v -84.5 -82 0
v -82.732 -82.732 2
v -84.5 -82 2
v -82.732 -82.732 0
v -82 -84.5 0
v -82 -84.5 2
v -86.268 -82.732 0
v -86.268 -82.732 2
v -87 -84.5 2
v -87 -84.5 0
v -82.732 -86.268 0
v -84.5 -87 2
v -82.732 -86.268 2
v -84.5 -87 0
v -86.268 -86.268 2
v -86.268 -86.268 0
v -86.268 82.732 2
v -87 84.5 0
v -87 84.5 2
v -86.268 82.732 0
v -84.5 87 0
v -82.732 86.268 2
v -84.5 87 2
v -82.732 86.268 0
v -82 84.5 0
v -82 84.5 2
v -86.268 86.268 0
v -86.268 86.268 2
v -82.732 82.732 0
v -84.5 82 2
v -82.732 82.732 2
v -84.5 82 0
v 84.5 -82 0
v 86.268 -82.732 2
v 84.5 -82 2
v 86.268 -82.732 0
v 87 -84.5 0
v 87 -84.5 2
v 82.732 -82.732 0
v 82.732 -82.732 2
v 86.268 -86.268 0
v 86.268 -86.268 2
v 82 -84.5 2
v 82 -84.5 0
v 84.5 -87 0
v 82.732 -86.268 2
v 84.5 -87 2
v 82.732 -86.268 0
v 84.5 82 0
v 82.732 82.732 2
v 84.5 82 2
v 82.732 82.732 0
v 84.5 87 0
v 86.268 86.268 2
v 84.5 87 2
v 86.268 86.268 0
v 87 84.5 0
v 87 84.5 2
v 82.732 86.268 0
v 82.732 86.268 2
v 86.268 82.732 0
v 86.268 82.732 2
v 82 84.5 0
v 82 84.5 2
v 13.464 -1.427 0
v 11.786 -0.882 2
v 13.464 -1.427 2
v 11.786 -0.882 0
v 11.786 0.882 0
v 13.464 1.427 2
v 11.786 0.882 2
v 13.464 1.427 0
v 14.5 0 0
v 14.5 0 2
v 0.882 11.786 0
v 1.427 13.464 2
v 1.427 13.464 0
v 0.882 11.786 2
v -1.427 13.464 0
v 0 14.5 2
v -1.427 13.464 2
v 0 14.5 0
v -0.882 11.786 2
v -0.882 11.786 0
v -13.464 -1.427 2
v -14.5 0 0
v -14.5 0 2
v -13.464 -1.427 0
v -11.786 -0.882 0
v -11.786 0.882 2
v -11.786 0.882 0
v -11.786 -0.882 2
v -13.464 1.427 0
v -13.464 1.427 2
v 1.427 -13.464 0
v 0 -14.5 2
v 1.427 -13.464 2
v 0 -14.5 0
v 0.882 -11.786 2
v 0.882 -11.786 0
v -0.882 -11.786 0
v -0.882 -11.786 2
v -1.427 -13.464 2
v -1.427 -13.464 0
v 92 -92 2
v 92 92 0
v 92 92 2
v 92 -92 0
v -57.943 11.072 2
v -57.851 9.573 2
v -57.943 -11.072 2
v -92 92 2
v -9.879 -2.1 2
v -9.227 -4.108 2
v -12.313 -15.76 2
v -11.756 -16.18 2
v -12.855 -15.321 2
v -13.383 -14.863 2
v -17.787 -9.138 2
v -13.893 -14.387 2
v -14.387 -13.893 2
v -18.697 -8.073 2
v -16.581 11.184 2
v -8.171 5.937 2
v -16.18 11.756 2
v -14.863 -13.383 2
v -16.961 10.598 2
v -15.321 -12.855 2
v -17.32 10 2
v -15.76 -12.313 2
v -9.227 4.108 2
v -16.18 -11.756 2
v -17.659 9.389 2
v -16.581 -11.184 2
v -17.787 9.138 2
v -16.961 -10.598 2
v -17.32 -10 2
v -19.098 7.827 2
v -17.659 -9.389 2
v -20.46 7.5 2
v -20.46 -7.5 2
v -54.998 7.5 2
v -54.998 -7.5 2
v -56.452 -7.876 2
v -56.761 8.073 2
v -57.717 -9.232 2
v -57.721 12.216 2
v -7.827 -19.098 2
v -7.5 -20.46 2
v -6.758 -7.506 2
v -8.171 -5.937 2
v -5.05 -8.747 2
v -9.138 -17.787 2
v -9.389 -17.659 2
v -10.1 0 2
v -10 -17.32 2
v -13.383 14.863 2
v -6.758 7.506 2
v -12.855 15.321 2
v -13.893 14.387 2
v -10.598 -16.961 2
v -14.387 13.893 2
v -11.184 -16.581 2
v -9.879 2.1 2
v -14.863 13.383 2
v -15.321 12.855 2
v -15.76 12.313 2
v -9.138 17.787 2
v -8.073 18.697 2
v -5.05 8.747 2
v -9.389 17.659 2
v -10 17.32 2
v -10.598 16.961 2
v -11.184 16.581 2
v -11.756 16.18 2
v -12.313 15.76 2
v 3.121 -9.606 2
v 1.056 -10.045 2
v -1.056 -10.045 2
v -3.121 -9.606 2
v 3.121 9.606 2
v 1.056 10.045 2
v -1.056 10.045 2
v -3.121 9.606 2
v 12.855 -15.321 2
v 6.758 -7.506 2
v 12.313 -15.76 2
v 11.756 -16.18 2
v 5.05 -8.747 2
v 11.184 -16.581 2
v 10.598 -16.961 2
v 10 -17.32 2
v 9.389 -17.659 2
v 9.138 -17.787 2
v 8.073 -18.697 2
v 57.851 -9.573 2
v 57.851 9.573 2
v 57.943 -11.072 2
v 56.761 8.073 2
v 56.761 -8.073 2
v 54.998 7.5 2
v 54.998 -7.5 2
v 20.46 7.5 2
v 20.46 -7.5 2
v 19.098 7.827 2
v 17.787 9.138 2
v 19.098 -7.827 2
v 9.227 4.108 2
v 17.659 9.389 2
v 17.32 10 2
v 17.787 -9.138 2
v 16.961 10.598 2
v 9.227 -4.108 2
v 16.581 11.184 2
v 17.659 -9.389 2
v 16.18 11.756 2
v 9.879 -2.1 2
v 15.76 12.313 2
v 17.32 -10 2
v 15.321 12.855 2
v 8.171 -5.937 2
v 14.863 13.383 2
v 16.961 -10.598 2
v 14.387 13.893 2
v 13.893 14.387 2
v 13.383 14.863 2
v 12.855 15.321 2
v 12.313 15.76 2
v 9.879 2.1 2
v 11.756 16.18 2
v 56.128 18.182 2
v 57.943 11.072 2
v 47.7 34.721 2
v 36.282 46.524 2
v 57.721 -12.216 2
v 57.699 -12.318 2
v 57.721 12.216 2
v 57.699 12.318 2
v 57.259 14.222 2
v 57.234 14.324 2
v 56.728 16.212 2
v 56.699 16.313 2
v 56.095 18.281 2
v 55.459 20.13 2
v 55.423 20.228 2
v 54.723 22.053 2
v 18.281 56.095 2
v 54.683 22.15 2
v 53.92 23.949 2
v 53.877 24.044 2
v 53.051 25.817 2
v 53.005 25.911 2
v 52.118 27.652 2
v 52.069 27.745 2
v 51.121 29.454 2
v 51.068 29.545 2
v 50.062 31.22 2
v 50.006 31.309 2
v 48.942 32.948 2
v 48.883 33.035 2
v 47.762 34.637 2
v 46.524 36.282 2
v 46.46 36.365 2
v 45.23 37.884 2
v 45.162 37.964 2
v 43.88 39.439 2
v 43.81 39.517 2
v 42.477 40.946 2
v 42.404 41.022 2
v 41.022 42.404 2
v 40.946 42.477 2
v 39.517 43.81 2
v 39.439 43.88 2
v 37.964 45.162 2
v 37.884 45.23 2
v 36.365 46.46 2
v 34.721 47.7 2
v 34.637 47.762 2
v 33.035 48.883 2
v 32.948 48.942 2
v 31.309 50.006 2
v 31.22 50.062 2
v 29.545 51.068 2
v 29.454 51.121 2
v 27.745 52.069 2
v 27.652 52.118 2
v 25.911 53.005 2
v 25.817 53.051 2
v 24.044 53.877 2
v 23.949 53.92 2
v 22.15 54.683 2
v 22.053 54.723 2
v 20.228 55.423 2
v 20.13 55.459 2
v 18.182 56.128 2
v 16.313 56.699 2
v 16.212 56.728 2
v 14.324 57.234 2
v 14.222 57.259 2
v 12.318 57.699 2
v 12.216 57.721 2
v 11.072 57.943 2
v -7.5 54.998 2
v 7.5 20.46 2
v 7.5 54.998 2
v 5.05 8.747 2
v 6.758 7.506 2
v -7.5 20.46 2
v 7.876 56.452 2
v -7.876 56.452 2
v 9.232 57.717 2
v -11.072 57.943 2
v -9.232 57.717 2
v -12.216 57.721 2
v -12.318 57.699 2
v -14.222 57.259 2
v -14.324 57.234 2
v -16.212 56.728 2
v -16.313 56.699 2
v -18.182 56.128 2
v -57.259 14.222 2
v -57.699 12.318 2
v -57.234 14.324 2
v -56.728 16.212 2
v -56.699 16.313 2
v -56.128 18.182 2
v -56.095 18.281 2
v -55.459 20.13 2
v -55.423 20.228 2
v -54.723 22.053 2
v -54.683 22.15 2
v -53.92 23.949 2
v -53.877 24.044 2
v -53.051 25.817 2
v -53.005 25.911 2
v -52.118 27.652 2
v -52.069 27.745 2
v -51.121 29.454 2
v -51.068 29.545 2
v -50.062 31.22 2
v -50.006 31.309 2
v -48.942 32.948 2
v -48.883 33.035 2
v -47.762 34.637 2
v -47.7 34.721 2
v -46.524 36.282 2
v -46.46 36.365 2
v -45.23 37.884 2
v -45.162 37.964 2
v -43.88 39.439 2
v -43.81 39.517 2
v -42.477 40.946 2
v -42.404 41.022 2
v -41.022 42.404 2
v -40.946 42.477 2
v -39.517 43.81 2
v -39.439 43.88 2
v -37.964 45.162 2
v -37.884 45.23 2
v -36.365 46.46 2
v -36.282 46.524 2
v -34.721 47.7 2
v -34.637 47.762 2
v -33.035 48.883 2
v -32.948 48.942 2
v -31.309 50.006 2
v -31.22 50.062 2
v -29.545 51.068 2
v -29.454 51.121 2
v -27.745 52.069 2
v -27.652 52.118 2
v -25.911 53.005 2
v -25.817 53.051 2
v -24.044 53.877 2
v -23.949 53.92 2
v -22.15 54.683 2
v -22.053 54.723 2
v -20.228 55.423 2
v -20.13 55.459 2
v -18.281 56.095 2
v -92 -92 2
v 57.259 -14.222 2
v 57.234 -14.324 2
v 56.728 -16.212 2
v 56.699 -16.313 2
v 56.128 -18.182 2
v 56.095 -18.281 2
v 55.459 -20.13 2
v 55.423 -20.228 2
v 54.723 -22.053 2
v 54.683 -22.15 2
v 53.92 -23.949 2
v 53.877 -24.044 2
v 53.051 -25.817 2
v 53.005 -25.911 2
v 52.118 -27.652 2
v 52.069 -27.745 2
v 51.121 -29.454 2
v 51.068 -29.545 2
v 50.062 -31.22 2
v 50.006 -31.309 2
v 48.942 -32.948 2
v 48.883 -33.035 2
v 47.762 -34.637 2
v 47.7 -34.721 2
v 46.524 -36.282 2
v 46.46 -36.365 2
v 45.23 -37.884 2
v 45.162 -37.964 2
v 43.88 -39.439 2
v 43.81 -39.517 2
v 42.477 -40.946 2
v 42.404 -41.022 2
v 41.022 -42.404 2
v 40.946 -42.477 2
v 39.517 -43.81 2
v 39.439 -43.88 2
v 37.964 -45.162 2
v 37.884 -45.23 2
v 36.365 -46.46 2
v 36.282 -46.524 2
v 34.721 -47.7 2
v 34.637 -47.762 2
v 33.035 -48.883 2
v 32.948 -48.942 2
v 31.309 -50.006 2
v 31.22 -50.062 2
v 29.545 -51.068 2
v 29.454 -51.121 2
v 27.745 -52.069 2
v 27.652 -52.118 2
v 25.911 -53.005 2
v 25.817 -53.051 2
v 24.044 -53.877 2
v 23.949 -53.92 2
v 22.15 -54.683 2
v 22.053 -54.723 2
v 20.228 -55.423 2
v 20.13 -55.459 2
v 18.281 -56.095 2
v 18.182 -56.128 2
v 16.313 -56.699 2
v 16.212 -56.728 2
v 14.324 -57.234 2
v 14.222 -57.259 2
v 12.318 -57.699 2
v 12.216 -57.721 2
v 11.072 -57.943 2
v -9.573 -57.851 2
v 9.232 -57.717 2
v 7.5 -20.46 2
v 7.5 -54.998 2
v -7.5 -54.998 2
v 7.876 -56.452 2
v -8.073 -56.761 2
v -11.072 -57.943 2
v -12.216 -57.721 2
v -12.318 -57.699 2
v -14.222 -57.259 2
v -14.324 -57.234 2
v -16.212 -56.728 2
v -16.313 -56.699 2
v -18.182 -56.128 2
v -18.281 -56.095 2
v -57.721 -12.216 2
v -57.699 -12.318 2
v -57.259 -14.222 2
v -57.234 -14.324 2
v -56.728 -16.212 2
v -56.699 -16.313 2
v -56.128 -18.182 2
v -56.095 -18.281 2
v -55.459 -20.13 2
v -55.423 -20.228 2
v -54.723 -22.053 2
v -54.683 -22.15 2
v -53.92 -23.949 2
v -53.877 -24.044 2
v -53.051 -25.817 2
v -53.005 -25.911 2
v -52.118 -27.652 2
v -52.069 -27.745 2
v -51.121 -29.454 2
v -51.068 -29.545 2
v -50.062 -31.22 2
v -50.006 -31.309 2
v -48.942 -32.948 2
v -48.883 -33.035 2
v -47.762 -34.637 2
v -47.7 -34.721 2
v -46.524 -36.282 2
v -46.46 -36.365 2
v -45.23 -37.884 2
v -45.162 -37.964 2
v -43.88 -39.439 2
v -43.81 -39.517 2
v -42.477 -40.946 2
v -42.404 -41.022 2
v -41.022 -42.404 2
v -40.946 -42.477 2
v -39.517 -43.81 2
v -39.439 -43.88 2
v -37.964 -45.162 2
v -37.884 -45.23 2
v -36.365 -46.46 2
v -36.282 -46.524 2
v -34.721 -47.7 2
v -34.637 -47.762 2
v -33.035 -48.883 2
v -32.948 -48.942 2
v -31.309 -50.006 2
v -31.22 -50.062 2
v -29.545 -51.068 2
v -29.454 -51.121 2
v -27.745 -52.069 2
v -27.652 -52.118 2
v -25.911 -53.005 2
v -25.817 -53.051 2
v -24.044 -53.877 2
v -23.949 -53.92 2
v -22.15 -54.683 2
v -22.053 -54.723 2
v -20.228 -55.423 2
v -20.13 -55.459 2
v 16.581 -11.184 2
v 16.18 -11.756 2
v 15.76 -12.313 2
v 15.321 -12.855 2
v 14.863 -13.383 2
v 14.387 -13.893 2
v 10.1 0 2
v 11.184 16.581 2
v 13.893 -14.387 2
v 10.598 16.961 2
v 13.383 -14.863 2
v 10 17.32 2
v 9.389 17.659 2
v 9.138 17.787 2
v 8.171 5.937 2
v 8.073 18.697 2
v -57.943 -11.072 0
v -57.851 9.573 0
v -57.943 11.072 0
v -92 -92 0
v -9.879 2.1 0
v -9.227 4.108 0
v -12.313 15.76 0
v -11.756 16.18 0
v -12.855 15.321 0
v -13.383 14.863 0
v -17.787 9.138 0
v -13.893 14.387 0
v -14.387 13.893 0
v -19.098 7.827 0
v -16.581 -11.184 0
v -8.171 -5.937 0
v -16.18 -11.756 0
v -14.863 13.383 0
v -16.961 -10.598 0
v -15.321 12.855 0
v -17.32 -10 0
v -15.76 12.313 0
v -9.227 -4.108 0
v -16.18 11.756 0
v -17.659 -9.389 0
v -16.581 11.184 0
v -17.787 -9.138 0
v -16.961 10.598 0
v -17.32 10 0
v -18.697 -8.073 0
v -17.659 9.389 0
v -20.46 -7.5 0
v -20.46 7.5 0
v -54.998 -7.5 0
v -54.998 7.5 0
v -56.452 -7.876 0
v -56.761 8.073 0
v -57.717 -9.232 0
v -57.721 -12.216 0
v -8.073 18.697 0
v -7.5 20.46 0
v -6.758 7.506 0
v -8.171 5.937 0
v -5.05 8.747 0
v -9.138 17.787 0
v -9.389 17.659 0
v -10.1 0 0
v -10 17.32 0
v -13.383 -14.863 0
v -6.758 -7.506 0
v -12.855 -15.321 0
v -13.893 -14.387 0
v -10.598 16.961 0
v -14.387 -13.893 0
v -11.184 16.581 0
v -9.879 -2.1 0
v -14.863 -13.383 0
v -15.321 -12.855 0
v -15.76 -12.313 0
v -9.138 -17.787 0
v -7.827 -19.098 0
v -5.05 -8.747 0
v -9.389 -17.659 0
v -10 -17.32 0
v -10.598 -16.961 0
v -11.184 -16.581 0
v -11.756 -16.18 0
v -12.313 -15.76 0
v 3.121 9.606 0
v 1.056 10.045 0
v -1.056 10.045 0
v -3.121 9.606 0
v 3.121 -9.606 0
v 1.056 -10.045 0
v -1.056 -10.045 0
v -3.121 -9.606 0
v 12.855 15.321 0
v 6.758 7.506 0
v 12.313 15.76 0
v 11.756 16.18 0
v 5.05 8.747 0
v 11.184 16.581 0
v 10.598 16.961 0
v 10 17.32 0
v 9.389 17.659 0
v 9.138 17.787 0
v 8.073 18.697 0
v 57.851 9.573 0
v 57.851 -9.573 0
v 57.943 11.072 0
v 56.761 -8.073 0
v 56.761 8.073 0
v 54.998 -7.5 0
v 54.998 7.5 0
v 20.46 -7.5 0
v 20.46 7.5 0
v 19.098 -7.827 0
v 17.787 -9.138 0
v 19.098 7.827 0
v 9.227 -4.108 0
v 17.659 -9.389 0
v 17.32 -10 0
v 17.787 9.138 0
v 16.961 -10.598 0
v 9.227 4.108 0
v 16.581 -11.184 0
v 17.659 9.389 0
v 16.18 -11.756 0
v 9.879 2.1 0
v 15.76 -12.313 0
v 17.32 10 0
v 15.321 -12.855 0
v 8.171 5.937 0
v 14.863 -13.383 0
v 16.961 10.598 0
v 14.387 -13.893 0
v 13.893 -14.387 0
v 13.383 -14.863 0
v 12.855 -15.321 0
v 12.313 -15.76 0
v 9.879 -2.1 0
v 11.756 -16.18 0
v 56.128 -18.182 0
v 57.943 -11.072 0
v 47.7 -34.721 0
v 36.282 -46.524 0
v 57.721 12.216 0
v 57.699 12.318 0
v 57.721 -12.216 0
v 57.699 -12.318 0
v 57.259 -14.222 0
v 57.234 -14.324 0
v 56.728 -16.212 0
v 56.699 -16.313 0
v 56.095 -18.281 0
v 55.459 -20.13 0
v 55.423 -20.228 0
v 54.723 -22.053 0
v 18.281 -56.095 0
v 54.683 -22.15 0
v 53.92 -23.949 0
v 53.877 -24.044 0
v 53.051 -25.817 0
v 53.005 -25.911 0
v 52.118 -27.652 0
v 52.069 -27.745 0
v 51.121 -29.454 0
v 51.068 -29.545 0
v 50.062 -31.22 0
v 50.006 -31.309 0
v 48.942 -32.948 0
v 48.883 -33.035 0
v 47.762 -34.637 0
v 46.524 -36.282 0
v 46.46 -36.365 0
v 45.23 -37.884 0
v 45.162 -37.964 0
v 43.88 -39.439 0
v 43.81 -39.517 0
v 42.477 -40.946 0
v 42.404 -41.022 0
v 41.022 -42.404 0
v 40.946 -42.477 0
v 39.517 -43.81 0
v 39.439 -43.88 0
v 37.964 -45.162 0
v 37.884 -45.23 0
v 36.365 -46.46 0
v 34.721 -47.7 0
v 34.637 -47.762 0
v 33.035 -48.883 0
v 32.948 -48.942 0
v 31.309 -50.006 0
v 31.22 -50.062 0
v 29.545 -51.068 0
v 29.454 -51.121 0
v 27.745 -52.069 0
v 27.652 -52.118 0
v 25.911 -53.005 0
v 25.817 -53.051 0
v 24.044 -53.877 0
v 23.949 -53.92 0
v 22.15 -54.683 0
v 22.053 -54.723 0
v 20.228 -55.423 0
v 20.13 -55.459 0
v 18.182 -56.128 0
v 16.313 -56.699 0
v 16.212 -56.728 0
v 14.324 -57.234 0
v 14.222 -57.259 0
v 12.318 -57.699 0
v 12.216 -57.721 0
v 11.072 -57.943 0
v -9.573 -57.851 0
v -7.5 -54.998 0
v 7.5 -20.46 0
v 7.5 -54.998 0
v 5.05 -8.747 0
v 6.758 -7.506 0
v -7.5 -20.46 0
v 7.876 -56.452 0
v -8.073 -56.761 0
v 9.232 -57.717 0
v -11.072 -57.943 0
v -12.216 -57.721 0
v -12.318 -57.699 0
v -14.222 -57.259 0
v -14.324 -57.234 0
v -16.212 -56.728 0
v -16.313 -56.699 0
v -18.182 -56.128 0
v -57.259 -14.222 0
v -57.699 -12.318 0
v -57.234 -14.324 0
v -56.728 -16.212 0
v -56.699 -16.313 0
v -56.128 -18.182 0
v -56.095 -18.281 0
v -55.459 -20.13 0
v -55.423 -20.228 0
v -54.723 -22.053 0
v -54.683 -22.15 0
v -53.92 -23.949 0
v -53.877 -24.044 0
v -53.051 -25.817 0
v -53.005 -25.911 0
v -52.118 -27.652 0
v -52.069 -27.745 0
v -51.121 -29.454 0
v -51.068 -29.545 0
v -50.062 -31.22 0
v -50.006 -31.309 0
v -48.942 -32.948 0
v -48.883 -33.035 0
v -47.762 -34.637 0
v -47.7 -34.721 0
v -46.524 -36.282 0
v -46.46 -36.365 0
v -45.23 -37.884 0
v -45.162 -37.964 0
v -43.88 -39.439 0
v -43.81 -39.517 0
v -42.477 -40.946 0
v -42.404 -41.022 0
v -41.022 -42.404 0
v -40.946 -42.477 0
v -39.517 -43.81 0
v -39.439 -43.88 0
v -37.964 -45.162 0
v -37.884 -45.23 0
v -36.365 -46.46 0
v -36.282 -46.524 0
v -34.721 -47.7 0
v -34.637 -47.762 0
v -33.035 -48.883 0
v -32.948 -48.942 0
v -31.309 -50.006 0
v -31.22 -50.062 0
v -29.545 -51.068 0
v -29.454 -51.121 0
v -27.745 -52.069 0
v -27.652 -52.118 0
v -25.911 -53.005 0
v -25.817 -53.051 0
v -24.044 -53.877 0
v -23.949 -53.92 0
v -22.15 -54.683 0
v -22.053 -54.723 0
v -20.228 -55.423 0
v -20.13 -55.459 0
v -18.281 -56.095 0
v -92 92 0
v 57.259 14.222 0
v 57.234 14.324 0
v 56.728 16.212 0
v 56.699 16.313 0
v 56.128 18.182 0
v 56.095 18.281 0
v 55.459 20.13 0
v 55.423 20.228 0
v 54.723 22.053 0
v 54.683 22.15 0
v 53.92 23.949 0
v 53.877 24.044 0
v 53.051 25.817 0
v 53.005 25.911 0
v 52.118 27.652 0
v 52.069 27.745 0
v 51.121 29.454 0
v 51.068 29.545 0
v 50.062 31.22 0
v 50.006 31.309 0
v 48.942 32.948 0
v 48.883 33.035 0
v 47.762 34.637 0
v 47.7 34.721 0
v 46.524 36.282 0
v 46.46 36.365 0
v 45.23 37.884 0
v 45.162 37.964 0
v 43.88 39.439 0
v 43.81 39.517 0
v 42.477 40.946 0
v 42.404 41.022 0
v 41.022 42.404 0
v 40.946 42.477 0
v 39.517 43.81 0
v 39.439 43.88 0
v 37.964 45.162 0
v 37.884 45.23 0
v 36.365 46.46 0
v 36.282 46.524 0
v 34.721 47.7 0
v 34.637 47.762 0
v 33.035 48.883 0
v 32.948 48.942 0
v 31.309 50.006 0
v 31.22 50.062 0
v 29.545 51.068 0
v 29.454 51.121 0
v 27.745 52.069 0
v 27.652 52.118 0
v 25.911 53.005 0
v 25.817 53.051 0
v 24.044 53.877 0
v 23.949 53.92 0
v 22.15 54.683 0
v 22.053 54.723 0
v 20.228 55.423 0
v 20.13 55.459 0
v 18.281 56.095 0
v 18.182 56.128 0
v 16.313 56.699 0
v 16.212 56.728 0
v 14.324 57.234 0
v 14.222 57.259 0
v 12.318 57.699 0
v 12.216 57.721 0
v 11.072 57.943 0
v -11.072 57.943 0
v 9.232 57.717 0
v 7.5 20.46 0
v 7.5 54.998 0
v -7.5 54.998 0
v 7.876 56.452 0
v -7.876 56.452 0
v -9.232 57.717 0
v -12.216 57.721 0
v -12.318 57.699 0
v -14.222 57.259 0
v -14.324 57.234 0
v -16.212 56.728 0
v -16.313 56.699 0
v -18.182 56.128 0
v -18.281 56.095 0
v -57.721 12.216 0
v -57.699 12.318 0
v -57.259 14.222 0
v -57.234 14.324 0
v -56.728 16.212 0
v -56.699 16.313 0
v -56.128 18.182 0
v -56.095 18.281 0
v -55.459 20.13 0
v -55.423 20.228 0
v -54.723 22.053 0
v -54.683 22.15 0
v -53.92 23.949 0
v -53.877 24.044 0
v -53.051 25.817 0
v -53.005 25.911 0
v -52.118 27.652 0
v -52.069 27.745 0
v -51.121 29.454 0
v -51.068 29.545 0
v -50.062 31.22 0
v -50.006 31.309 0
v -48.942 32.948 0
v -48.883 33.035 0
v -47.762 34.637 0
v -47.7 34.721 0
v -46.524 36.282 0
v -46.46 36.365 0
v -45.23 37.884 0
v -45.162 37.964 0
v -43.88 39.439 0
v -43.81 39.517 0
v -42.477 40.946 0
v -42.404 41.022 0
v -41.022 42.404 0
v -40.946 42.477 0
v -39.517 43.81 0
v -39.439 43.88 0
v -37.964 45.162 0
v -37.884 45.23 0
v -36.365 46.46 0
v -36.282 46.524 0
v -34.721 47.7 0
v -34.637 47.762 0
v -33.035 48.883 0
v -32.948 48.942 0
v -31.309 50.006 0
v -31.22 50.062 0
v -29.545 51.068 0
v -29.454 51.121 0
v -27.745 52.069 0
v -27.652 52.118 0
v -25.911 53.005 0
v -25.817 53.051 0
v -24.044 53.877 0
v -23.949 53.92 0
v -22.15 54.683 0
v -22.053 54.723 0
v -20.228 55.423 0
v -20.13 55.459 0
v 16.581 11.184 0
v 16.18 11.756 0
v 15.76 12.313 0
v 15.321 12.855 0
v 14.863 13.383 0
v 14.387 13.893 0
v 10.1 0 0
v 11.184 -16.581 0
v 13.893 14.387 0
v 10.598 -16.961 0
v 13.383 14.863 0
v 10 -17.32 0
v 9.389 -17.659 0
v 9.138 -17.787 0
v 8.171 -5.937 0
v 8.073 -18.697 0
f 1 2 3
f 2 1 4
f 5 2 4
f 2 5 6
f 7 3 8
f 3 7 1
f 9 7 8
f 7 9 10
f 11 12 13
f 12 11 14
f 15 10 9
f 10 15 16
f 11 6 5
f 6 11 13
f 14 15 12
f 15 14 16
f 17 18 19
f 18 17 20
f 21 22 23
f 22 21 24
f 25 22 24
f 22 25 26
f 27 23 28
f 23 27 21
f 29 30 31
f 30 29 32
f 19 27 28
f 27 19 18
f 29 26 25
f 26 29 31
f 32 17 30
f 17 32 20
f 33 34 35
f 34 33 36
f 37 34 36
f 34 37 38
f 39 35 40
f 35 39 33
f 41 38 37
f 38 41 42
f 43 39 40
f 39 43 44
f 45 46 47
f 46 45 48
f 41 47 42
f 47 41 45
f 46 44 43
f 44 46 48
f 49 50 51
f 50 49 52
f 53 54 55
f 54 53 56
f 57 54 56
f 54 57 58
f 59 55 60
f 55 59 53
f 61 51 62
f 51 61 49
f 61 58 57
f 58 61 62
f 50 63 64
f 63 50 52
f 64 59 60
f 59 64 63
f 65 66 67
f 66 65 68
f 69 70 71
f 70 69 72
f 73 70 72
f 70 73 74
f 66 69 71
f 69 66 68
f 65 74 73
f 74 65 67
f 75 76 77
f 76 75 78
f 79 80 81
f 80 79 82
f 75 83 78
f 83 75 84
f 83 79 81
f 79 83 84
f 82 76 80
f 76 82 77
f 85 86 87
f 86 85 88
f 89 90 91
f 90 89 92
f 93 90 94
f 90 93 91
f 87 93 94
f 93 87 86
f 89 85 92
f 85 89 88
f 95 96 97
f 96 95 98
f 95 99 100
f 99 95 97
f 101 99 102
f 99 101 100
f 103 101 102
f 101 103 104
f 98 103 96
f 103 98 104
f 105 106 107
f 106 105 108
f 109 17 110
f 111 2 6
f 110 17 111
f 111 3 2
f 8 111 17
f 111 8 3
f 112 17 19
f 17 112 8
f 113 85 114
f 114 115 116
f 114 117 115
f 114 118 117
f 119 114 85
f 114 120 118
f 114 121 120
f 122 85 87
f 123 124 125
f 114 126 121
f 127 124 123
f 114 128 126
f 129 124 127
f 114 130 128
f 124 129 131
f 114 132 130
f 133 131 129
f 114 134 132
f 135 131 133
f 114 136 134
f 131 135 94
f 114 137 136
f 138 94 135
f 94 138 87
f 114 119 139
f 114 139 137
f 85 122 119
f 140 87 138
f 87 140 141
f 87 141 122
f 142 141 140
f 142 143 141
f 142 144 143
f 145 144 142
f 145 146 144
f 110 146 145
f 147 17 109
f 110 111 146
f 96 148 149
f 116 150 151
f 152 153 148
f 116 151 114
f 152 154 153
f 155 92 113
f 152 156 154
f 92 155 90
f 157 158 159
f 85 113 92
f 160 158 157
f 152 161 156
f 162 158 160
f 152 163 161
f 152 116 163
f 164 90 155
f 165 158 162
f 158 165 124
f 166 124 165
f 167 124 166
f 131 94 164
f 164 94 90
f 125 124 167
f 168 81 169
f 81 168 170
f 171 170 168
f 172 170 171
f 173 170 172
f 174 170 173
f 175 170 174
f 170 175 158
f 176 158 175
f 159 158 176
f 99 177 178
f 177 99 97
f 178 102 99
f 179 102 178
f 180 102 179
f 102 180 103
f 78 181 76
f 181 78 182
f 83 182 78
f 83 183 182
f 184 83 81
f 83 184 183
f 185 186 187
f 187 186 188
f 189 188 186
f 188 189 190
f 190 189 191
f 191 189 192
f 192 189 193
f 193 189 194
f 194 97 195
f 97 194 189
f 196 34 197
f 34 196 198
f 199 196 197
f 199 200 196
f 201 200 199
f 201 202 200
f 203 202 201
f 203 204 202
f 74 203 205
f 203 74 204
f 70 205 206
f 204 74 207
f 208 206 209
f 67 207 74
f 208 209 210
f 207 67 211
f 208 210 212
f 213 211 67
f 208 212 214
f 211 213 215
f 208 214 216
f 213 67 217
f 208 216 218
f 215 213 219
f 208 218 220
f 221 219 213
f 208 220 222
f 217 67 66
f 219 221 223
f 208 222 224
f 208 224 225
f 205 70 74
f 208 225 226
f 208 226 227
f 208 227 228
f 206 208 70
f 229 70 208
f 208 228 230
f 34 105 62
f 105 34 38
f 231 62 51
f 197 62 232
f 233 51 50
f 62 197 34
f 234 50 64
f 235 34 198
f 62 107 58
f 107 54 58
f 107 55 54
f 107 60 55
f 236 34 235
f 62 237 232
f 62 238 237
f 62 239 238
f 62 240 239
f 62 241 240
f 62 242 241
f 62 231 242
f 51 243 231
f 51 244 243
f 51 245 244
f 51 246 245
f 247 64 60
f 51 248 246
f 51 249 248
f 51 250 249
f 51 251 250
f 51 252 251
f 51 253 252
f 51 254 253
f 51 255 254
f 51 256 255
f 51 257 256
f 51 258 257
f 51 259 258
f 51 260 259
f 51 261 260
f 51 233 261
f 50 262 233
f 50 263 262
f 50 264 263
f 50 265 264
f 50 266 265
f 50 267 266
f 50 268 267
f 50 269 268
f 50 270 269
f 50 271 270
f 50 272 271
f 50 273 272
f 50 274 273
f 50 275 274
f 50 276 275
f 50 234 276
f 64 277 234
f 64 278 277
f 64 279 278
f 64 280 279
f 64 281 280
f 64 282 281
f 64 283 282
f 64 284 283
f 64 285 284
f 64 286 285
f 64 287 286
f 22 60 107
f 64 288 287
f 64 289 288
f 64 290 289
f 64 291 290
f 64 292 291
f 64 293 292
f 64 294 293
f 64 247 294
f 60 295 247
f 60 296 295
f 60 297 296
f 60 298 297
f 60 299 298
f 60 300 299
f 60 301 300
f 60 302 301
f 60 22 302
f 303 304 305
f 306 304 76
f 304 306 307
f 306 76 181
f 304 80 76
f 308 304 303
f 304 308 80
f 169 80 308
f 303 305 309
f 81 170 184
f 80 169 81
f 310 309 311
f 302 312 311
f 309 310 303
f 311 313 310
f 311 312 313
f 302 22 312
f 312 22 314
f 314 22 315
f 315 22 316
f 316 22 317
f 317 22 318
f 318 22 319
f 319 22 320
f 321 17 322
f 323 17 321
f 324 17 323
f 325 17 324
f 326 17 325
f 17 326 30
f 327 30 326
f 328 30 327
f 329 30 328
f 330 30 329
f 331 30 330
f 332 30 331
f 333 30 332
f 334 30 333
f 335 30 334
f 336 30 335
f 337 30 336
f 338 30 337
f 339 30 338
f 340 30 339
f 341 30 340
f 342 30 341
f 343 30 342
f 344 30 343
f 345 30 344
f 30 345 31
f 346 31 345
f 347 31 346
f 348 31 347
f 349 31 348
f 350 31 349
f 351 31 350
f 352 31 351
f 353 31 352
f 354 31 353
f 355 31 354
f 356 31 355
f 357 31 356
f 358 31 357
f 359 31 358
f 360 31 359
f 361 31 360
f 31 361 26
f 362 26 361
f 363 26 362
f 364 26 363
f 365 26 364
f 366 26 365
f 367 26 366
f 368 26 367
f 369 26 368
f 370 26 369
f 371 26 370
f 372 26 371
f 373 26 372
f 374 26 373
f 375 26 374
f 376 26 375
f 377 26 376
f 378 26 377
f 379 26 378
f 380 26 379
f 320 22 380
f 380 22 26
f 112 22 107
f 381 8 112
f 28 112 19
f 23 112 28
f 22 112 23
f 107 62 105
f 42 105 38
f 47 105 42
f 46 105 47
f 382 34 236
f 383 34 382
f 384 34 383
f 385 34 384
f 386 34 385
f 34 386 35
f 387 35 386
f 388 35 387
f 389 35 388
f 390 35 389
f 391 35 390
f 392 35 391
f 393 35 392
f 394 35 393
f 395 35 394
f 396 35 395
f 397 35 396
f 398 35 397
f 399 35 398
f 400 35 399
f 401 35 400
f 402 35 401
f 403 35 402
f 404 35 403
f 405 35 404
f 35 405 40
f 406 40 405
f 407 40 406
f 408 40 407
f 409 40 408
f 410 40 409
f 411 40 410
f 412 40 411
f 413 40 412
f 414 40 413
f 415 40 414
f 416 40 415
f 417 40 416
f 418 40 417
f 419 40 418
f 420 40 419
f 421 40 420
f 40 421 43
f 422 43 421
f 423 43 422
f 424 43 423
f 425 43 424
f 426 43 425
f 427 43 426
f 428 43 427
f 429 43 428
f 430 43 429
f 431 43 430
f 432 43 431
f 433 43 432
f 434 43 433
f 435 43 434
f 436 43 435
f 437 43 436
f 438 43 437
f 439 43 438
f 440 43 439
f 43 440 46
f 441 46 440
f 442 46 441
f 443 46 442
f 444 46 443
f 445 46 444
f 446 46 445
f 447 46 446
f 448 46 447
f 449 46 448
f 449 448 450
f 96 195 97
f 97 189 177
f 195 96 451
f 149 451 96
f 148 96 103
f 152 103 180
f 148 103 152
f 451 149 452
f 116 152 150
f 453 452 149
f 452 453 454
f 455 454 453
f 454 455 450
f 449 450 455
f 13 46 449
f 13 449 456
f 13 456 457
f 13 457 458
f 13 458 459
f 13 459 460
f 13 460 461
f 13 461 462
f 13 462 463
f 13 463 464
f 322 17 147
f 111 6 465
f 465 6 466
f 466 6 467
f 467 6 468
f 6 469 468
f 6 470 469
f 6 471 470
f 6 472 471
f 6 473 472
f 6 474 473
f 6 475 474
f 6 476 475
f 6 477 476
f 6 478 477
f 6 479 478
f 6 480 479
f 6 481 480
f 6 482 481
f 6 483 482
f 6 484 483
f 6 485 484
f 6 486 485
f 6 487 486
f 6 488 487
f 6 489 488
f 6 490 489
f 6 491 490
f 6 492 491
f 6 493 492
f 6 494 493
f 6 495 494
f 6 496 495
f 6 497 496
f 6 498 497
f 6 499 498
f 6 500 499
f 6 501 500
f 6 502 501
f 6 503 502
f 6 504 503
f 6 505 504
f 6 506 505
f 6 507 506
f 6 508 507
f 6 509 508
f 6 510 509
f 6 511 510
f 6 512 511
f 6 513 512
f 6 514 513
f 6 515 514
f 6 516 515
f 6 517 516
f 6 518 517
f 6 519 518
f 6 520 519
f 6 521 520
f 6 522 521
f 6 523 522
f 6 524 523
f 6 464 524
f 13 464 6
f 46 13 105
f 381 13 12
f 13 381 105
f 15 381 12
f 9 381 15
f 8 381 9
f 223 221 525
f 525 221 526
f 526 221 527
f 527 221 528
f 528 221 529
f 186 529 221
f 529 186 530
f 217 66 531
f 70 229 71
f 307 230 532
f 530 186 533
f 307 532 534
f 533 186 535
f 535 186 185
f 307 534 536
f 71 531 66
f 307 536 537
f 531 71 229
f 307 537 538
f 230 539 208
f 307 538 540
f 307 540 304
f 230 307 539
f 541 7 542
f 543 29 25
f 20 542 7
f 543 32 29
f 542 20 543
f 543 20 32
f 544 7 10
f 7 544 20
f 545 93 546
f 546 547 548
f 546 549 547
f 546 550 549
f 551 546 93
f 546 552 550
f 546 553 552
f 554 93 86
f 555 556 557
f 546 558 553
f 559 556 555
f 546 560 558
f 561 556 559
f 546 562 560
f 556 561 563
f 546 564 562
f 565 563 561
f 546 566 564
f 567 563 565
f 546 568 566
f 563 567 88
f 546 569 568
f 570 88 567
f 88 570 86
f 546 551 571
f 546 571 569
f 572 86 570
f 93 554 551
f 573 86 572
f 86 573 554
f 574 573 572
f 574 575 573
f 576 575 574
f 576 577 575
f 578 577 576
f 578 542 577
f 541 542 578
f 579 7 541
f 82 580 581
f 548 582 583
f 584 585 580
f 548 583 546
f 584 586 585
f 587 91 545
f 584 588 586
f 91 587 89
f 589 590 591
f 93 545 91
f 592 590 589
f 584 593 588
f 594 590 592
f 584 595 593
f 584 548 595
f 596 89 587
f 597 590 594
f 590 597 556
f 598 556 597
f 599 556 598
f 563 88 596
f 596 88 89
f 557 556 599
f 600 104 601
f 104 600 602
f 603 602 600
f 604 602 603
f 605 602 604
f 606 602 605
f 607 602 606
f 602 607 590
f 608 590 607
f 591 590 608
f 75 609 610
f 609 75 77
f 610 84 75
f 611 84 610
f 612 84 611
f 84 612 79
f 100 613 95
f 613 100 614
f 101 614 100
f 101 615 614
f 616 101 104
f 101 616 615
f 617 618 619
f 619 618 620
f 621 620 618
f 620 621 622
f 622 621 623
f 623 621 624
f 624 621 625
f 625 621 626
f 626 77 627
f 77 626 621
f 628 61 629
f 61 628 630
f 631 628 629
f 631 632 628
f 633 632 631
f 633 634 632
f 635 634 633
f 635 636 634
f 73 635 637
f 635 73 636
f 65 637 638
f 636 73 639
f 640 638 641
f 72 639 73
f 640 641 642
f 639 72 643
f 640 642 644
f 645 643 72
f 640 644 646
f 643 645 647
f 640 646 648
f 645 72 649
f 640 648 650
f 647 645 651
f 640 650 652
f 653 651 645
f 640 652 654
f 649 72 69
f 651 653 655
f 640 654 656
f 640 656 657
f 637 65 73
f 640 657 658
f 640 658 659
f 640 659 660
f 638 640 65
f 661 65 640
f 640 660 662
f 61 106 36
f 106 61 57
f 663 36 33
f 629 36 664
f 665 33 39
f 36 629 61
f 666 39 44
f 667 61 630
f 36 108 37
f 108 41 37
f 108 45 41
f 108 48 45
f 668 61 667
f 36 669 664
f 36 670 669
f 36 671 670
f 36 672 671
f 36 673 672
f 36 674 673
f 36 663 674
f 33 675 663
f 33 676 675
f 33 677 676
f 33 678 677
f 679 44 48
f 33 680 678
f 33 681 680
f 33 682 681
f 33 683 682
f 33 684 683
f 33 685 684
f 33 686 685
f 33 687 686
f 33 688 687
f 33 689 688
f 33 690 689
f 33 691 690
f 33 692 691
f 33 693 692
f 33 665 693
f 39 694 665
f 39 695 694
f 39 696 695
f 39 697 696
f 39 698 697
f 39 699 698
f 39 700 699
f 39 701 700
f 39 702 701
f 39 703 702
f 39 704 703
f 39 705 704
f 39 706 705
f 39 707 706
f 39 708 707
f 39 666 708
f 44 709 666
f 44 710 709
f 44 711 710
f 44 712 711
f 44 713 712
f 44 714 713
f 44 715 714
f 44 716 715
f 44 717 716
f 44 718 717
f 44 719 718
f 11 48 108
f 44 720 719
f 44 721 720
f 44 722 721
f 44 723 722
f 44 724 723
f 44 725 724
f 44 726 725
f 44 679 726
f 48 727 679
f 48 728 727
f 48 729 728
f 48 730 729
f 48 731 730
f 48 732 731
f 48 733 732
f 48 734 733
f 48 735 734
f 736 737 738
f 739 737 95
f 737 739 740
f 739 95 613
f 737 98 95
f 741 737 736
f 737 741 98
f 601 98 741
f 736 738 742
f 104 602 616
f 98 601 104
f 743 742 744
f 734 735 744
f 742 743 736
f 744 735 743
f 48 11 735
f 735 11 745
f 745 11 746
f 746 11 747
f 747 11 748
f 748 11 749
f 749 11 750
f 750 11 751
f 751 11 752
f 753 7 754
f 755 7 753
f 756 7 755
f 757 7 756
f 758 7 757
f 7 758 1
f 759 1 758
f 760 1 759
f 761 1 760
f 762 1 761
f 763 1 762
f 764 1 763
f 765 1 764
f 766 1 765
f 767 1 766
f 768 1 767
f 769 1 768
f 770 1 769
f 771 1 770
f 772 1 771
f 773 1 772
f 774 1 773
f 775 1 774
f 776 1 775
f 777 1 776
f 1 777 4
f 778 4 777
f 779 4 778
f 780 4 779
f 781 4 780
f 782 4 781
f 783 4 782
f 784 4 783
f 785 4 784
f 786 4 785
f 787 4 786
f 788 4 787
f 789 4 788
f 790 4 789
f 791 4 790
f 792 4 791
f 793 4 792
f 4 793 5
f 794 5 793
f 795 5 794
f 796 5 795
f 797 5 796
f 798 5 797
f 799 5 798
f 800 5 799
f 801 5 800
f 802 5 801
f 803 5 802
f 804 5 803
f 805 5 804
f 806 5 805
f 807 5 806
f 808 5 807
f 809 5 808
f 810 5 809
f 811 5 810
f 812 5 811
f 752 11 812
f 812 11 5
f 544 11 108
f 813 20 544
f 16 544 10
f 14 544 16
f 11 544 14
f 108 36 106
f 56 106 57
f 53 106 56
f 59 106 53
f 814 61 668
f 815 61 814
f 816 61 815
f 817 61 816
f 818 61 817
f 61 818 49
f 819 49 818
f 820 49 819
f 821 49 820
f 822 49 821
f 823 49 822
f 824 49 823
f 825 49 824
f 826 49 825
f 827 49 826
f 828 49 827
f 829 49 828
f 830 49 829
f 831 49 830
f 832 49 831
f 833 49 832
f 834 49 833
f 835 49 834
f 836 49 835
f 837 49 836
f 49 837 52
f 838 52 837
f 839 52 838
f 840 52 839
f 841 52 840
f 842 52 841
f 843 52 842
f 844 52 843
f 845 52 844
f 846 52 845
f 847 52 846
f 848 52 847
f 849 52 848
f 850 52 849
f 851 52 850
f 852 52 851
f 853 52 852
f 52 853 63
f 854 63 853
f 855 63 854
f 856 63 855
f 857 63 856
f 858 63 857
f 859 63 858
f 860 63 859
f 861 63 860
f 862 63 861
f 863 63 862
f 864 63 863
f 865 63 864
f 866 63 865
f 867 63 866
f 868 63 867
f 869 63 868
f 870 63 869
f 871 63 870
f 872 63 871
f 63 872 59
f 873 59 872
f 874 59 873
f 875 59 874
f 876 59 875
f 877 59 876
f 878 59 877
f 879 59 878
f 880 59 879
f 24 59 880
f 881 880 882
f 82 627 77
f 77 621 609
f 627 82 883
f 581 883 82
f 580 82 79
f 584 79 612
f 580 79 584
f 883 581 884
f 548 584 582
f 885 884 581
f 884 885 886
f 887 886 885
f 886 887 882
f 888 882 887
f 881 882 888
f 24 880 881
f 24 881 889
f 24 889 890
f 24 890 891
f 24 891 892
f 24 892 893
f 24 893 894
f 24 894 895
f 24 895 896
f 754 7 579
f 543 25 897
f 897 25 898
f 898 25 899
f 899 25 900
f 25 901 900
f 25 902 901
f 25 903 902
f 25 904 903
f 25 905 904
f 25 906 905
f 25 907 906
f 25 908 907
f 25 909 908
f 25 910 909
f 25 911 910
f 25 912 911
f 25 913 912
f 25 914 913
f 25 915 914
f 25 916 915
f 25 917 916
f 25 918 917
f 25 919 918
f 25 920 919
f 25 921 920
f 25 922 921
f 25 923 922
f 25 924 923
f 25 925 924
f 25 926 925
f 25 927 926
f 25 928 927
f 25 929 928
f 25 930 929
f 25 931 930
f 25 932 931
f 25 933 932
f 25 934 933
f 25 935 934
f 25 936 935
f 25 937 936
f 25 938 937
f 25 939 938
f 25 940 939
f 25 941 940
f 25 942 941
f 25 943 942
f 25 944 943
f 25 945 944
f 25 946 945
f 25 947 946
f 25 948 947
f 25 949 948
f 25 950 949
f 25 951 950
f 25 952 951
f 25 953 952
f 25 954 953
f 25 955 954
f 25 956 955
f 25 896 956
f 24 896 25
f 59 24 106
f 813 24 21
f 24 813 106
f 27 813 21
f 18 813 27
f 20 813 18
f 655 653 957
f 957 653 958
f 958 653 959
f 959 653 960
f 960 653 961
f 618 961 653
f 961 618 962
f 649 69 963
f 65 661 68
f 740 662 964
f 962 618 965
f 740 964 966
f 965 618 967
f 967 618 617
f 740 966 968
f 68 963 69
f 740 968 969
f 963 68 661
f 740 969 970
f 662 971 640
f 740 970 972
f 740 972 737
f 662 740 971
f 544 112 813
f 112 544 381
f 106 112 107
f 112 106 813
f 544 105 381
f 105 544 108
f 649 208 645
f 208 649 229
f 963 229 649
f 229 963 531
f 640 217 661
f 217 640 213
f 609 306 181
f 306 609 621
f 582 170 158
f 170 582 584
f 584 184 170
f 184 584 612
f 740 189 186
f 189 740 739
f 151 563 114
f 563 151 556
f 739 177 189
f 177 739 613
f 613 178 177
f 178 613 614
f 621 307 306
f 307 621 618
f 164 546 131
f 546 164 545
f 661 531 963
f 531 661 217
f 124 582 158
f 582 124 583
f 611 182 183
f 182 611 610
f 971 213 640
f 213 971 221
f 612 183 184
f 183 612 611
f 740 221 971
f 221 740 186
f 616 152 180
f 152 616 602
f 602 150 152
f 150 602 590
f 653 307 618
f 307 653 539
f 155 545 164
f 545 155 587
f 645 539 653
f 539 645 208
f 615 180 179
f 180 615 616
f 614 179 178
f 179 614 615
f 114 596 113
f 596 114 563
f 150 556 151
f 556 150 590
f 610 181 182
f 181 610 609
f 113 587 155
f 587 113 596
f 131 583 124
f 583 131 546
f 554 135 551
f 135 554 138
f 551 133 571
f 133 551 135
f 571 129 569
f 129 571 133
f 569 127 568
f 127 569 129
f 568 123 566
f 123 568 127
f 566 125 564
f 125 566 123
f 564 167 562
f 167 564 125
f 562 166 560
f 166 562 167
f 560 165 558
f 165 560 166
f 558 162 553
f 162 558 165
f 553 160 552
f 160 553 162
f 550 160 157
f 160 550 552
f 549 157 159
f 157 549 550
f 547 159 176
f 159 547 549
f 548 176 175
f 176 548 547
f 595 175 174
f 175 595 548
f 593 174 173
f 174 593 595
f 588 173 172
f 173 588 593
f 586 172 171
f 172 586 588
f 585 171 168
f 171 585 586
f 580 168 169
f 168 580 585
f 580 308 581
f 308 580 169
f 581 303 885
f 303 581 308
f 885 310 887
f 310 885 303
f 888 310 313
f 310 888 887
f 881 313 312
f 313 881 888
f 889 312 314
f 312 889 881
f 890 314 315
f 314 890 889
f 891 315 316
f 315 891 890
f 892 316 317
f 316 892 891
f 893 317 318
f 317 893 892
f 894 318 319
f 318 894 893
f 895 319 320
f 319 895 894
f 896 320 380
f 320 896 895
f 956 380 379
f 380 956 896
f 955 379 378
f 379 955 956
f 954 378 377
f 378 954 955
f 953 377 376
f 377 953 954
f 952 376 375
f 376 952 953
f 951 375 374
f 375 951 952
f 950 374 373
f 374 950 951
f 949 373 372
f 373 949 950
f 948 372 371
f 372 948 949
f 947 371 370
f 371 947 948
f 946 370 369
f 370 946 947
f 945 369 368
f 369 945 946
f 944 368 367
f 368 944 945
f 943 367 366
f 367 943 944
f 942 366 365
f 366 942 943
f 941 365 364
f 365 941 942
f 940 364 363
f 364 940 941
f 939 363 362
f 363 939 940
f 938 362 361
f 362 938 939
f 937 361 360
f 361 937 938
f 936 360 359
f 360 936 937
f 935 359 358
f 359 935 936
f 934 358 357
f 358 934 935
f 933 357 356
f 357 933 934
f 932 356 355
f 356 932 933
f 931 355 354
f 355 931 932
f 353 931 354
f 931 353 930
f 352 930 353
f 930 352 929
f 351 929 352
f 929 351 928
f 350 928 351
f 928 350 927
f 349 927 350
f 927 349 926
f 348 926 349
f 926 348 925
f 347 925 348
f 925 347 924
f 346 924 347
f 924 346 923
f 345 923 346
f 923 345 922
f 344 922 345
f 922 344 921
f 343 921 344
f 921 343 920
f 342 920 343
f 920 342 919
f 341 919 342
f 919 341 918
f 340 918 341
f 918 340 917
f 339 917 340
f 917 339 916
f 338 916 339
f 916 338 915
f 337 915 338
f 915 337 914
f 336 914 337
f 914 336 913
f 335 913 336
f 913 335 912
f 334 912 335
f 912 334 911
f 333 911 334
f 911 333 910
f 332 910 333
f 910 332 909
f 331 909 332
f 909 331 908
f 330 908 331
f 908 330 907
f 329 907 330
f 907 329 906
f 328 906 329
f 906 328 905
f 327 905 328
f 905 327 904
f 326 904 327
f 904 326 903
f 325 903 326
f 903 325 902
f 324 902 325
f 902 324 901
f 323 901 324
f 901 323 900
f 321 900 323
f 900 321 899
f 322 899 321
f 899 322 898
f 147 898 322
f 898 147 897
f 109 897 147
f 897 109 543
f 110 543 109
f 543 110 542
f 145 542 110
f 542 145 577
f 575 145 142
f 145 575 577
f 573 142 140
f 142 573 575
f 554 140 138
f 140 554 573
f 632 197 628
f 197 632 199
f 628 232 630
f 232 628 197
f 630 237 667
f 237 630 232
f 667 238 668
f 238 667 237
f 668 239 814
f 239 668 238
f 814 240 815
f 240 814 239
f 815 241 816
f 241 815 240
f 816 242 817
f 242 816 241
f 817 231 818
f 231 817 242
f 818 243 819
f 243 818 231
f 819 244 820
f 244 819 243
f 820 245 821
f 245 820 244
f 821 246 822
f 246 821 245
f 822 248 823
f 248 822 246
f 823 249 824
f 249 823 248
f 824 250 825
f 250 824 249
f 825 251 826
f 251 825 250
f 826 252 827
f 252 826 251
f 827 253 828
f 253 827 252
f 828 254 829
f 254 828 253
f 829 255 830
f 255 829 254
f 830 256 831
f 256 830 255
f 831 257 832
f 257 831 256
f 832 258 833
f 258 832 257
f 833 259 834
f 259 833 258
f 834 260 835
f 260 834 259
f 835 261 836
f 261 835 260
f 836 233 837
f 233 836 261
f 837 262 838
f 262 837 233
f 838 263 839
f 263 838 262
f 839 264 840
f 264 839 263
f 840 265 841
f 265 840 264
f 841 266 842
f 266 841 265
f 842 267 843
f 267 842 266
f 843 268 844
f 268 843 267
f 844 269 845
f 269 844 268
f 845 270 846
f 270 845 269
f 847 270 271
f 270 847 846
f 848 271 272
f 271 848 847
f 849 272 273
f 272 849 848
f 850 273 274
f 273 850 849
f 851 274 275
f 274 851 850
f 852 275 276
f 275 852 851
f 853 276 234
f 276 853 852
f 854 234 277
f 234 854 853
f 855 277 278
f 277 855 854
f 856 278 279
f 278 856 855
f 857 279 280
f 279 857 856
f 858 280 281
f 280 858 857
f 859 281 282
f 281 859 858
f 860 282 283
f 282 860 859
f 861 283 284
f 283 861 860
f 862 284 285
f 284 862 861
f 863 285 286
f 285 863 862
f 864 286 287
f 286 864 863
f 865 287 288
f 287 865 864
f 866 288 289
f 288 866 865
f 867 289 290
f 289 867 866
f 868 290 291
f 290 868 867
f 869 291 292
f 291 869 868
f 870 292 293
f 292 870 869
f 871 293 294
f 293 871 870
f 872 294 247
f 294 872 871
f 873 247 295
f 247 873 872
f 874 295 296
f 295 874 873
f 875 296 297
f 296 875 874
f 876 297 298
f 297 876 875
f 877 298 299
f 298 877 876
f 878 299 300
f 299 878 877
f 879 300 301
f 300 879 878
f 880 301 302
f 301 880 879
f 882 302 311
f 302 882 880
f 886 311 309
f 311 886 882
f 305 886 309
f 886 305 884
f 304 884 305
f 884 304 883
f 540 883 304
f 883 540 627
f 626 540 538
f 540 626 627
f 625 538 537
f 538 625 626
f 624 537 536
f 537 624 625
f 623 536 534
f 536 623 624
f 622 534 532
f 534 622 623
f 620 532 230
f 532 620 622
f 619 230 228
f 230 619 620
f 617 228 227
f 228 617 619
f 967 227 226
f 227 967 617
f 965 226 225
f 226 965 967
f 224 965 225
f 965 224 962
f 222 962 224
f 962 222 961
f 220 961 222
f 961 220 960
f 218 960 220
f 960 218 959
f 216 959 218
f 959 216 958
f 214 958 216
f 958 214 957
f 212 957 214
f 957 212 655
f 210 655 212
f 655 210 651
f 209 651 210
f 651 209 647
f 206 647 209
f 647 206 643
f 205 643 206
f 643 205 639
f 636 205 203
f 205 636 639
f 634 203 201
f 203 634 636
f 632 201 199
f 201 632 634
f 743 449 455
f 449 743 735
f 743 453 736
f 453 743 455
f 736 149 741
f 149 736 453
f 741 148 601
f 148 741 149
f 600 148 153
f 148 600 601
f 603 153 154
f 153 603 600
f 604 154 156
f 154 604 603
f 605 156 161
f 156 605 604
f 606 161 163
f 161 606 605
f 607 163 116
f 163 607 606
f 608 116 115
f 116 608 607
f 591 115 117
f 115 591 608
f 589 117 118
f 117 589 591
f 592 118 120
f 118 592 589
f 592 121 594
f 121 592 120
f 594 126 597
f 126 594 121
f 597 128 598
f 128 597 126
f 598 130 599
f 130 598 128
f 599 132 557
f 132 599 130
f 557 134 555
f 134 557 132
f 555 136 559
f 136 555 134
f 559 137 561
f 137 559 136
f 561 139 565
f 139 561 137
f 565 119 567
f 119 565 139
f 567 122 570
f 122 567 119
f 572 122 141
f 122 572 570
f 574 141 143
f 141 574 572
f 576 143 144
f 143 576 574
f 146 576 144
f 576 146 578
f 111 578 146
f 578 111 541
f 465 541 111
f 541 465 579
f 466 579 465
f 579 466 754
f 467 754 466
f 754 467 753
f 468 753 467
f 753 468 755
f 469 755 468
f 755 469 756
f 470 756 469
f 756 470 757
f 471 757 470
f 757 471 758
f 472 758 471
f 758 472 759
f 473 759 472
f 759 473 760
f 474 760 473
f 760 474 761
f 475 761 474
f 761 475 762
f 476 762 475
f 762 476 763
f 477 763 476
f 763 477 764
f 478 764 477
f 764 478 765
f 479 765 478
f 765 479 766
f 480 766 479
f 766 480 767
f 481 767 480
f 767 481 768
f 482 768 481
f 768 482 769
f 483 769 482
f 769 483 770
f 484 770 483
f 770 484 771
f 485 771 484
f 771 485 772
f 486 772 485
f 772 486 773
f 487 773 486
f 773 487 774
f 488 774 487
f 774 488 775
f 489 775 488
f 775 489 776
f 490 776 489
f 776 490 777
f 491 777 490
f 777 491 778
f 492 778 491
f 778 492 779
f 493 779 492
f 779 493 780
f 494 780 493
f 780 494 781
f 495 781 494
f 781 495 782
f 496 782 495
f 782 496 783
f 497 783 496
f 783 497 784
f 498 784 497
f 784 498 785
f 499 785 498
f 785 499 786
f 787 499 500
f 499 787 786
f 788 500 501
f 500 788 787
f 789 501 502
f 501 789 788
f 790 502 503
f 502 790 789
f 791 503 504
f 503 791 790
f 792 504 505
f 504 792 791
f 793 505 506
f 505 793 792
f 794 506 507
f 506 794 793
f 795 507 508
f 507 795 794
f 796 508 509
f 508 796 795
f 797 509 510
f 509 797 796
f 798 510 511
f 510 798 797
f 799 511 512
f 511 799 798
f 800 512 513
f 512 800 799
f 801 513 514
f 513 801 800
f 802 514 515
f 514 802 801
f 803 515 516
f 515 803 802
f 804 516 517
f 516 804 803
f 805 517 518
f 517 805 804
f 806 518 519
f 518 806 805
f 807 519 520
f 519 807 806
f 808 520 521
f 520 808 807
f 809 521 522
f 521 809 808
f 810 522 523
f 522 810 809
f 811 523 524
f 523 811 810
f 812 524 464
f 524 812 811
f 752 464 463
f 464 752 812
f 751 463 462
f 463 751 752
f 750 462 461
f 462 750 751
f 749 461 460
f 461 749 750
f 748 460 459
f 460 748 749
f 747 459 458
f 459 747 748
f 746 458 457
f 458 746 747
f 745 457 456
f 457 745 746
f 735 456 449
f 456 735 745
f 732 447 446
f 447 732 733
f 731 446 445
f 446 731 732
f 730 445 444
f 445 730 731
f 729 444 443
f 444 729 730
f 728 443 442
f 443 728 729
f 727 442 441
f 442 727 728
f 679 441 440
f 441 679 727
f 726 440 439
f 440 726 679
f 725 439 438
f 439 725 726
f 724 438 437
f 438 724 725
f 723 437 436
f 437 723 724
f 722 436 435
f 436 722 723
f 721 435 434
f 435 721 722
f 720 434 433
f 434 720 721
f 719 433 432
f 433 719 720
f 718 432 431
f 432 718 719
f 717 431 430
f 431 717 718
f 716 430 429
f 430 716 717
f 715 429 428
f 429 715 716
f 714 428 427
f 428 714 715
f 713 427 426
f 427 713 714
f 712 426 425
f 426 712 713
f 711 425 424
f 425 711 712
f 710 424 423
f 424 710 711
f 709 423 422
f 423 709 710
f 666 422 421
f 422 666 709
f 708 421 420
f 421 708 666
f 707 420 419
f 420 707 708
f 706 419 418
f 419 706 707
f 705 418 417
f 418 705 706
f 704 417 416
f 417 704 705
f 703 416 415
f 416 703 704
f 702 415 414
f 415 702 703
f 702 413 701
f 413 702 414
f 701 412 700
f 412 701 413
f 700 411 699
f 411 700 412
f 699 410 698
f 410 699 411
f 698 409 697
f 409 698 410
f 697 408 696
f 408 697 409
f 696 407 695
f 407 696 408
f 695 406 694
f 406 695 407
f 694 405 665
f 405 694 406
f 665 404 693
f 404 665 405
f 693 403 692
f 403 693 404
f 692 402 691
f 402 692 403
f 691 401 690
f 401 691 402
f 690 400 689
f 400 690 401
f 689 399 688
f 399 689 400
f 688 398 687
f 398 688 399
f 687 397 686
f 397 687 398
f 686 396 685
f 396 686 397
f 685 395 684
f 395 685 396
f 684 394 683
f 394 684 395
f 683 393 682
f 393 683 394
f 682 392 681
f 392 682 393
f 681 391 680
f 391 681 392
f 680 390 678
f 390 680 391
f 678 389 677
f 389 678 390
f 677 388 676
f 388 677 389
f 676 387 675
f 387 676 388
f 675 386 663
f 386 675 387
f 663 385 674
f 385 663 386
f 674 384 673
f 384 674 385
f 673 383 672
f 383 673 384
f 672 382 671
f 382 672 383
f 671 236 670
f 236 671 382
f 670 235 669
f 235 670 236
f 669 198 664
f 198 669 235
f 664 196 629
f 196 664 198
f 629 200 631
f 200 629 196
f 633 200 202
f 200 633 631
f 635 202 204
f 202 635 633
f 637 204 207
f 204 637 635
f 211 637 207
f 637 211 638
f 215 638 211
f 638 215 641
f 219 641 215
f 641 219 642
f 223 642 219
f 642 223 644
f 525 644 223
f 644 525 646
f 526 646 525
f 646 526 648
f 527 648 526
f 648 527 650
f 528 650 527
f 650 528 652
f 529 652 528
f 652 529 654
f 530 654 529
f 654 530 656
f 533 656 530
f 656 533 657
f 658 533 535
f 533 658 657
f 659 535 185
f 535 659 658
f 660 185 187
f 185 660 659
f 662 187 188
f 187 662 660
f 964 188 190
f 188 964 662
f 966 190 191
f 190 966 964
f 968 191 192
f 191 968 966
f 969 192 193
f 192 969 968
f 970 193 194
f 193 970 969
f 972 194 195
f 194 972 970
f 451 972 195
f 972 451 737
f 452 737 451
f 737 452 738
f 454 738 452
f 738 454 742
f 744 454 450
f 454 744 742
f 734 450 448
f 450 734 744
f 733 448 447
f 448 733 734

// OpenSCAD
// part_id: sp5
// name: SP5 superior plate
// source_drawing_ids: DRW-022;DRW-056
// units: mm
// revision: 0.2-drw022
// SPDX-License-Identifier: MIT

module sp5_quadrant_window(r_inner = 20.0, r_outer = 59.0, neck_half = 7.5, fillet_r = 3.0) {
    // Window profile based on DRW-022: R59 outer, R20 inner, 15 mm neck gap.
    if (fillet_r > 0) {
        offset(r = fillet_r)
            offset(delta = -fillet_r)
                intersection() {
                    difference() {
                        circle(r = r_outer, $fn = 180);
                        circle(r = r_inner, $fn = 180);
                    }
                    translate([neck_half, neck_half]) square([r_outer, r_outer], center = false);
                }
    } else {
        intersection() {
            difference() {
                circle(r = r_outer, $fn = 180);
                circle(r = r_inner, $fn = 180);
            }
            translate([neck_half, neck_half]) square([r_outer, r_outer], center = false);
        }
    }
}

module part_sp5(
    size = 184.0,
    thickness = 2.0,
    corner_hole_d = 5.0,
    corner_offset = 7.5,
    center_bore_d = 20.2,
    rivet_hole_d = 3.0,
    rivet_radius = 13.0,
    window_outer_r = 59.0,
    window_inner_r = 20.0,
    window_neck_half = 7.5,
    window_fillet_r = 3.0
) {
    difference() {
        translate([-size / 2, -size / 2, 0]) cube([size, size, thickness], center = false);

        // Corner mounting holes.
        for (sx = [-1, 1], sy = [-1, 1]) {
            translate([sx * (size / 2 - corner_offset), sy * (size / 2 - corner_offset), -0.1])
                cylinder(d = corner_hole_d, h = thickness + 0.2, center = false);
        }

        // Main center bore.
        translate([0, 0, -0.1]) cylinder(d = center_bore_d, h = thickness + 0.2, center = false);

        // SP6 rivet pattern used to mount SP1/SP7 to SP5.
        for (a = [0, 90, 180, 270]) {
            rotate([0, 0, a]) translate([rivet_radius, 0, -0.1])
                cylinder(d = rivet_hole_d, h = thickness + 0.2, center = false);
        }

        // Four primary cutout windows.
        translate([0, 0, -0.1])
            linear_extrude(height = thickness + 0.2)
                for (sx = [-1, 1], sy = [-1, 1]) {
                    mirror([sx < 0 ? 1 : 0, sy < 0 ? 1 : 0, 0])
                        sp5_quadrant_window(
                            r_inner = window_inner_r,
                            r_outer = window_outer_r,
                            neck_half = window_neck_half,
                            fillet_r = window_fillet_r
                        );
                }
    }
}

module part_sp5_draw() {
    color("silver")
        linear_extrude(height = 0.01)
            difference() {
                square([184, 184], center = true);
                circle(d = 20.2, $fn = 180);
                for (a = [0, 90, 180, 270]) {
                    rotate([0, 0, a]) translate([13, 0]) circle(d = 3, $fn = 80);
                }
                for (sx = [-1, 1], sy = [-1, 1]) {
                    translate([sx * (92 - 7.5), sy * (92 - 7.5)]) circle(d = 5, $fn = 80);
                }
                for (sx = [-1, 1], sy = [-1, 1]) {
                    mirror([sx < 0 ? 1 : 0, sy < 0 ? 1 : 0, 0])
                        sp5_quadrant_window();
                }
            }
}

module part_sp5_print() {
    part_sp5();
}

module part_sp5_asm() {
    part_sp5();
}

// ---- "main guard" ----
// Default to previewing when opened directly:
if (is_undef(__LIB_MODE__)) {
    part_sp5();
}
